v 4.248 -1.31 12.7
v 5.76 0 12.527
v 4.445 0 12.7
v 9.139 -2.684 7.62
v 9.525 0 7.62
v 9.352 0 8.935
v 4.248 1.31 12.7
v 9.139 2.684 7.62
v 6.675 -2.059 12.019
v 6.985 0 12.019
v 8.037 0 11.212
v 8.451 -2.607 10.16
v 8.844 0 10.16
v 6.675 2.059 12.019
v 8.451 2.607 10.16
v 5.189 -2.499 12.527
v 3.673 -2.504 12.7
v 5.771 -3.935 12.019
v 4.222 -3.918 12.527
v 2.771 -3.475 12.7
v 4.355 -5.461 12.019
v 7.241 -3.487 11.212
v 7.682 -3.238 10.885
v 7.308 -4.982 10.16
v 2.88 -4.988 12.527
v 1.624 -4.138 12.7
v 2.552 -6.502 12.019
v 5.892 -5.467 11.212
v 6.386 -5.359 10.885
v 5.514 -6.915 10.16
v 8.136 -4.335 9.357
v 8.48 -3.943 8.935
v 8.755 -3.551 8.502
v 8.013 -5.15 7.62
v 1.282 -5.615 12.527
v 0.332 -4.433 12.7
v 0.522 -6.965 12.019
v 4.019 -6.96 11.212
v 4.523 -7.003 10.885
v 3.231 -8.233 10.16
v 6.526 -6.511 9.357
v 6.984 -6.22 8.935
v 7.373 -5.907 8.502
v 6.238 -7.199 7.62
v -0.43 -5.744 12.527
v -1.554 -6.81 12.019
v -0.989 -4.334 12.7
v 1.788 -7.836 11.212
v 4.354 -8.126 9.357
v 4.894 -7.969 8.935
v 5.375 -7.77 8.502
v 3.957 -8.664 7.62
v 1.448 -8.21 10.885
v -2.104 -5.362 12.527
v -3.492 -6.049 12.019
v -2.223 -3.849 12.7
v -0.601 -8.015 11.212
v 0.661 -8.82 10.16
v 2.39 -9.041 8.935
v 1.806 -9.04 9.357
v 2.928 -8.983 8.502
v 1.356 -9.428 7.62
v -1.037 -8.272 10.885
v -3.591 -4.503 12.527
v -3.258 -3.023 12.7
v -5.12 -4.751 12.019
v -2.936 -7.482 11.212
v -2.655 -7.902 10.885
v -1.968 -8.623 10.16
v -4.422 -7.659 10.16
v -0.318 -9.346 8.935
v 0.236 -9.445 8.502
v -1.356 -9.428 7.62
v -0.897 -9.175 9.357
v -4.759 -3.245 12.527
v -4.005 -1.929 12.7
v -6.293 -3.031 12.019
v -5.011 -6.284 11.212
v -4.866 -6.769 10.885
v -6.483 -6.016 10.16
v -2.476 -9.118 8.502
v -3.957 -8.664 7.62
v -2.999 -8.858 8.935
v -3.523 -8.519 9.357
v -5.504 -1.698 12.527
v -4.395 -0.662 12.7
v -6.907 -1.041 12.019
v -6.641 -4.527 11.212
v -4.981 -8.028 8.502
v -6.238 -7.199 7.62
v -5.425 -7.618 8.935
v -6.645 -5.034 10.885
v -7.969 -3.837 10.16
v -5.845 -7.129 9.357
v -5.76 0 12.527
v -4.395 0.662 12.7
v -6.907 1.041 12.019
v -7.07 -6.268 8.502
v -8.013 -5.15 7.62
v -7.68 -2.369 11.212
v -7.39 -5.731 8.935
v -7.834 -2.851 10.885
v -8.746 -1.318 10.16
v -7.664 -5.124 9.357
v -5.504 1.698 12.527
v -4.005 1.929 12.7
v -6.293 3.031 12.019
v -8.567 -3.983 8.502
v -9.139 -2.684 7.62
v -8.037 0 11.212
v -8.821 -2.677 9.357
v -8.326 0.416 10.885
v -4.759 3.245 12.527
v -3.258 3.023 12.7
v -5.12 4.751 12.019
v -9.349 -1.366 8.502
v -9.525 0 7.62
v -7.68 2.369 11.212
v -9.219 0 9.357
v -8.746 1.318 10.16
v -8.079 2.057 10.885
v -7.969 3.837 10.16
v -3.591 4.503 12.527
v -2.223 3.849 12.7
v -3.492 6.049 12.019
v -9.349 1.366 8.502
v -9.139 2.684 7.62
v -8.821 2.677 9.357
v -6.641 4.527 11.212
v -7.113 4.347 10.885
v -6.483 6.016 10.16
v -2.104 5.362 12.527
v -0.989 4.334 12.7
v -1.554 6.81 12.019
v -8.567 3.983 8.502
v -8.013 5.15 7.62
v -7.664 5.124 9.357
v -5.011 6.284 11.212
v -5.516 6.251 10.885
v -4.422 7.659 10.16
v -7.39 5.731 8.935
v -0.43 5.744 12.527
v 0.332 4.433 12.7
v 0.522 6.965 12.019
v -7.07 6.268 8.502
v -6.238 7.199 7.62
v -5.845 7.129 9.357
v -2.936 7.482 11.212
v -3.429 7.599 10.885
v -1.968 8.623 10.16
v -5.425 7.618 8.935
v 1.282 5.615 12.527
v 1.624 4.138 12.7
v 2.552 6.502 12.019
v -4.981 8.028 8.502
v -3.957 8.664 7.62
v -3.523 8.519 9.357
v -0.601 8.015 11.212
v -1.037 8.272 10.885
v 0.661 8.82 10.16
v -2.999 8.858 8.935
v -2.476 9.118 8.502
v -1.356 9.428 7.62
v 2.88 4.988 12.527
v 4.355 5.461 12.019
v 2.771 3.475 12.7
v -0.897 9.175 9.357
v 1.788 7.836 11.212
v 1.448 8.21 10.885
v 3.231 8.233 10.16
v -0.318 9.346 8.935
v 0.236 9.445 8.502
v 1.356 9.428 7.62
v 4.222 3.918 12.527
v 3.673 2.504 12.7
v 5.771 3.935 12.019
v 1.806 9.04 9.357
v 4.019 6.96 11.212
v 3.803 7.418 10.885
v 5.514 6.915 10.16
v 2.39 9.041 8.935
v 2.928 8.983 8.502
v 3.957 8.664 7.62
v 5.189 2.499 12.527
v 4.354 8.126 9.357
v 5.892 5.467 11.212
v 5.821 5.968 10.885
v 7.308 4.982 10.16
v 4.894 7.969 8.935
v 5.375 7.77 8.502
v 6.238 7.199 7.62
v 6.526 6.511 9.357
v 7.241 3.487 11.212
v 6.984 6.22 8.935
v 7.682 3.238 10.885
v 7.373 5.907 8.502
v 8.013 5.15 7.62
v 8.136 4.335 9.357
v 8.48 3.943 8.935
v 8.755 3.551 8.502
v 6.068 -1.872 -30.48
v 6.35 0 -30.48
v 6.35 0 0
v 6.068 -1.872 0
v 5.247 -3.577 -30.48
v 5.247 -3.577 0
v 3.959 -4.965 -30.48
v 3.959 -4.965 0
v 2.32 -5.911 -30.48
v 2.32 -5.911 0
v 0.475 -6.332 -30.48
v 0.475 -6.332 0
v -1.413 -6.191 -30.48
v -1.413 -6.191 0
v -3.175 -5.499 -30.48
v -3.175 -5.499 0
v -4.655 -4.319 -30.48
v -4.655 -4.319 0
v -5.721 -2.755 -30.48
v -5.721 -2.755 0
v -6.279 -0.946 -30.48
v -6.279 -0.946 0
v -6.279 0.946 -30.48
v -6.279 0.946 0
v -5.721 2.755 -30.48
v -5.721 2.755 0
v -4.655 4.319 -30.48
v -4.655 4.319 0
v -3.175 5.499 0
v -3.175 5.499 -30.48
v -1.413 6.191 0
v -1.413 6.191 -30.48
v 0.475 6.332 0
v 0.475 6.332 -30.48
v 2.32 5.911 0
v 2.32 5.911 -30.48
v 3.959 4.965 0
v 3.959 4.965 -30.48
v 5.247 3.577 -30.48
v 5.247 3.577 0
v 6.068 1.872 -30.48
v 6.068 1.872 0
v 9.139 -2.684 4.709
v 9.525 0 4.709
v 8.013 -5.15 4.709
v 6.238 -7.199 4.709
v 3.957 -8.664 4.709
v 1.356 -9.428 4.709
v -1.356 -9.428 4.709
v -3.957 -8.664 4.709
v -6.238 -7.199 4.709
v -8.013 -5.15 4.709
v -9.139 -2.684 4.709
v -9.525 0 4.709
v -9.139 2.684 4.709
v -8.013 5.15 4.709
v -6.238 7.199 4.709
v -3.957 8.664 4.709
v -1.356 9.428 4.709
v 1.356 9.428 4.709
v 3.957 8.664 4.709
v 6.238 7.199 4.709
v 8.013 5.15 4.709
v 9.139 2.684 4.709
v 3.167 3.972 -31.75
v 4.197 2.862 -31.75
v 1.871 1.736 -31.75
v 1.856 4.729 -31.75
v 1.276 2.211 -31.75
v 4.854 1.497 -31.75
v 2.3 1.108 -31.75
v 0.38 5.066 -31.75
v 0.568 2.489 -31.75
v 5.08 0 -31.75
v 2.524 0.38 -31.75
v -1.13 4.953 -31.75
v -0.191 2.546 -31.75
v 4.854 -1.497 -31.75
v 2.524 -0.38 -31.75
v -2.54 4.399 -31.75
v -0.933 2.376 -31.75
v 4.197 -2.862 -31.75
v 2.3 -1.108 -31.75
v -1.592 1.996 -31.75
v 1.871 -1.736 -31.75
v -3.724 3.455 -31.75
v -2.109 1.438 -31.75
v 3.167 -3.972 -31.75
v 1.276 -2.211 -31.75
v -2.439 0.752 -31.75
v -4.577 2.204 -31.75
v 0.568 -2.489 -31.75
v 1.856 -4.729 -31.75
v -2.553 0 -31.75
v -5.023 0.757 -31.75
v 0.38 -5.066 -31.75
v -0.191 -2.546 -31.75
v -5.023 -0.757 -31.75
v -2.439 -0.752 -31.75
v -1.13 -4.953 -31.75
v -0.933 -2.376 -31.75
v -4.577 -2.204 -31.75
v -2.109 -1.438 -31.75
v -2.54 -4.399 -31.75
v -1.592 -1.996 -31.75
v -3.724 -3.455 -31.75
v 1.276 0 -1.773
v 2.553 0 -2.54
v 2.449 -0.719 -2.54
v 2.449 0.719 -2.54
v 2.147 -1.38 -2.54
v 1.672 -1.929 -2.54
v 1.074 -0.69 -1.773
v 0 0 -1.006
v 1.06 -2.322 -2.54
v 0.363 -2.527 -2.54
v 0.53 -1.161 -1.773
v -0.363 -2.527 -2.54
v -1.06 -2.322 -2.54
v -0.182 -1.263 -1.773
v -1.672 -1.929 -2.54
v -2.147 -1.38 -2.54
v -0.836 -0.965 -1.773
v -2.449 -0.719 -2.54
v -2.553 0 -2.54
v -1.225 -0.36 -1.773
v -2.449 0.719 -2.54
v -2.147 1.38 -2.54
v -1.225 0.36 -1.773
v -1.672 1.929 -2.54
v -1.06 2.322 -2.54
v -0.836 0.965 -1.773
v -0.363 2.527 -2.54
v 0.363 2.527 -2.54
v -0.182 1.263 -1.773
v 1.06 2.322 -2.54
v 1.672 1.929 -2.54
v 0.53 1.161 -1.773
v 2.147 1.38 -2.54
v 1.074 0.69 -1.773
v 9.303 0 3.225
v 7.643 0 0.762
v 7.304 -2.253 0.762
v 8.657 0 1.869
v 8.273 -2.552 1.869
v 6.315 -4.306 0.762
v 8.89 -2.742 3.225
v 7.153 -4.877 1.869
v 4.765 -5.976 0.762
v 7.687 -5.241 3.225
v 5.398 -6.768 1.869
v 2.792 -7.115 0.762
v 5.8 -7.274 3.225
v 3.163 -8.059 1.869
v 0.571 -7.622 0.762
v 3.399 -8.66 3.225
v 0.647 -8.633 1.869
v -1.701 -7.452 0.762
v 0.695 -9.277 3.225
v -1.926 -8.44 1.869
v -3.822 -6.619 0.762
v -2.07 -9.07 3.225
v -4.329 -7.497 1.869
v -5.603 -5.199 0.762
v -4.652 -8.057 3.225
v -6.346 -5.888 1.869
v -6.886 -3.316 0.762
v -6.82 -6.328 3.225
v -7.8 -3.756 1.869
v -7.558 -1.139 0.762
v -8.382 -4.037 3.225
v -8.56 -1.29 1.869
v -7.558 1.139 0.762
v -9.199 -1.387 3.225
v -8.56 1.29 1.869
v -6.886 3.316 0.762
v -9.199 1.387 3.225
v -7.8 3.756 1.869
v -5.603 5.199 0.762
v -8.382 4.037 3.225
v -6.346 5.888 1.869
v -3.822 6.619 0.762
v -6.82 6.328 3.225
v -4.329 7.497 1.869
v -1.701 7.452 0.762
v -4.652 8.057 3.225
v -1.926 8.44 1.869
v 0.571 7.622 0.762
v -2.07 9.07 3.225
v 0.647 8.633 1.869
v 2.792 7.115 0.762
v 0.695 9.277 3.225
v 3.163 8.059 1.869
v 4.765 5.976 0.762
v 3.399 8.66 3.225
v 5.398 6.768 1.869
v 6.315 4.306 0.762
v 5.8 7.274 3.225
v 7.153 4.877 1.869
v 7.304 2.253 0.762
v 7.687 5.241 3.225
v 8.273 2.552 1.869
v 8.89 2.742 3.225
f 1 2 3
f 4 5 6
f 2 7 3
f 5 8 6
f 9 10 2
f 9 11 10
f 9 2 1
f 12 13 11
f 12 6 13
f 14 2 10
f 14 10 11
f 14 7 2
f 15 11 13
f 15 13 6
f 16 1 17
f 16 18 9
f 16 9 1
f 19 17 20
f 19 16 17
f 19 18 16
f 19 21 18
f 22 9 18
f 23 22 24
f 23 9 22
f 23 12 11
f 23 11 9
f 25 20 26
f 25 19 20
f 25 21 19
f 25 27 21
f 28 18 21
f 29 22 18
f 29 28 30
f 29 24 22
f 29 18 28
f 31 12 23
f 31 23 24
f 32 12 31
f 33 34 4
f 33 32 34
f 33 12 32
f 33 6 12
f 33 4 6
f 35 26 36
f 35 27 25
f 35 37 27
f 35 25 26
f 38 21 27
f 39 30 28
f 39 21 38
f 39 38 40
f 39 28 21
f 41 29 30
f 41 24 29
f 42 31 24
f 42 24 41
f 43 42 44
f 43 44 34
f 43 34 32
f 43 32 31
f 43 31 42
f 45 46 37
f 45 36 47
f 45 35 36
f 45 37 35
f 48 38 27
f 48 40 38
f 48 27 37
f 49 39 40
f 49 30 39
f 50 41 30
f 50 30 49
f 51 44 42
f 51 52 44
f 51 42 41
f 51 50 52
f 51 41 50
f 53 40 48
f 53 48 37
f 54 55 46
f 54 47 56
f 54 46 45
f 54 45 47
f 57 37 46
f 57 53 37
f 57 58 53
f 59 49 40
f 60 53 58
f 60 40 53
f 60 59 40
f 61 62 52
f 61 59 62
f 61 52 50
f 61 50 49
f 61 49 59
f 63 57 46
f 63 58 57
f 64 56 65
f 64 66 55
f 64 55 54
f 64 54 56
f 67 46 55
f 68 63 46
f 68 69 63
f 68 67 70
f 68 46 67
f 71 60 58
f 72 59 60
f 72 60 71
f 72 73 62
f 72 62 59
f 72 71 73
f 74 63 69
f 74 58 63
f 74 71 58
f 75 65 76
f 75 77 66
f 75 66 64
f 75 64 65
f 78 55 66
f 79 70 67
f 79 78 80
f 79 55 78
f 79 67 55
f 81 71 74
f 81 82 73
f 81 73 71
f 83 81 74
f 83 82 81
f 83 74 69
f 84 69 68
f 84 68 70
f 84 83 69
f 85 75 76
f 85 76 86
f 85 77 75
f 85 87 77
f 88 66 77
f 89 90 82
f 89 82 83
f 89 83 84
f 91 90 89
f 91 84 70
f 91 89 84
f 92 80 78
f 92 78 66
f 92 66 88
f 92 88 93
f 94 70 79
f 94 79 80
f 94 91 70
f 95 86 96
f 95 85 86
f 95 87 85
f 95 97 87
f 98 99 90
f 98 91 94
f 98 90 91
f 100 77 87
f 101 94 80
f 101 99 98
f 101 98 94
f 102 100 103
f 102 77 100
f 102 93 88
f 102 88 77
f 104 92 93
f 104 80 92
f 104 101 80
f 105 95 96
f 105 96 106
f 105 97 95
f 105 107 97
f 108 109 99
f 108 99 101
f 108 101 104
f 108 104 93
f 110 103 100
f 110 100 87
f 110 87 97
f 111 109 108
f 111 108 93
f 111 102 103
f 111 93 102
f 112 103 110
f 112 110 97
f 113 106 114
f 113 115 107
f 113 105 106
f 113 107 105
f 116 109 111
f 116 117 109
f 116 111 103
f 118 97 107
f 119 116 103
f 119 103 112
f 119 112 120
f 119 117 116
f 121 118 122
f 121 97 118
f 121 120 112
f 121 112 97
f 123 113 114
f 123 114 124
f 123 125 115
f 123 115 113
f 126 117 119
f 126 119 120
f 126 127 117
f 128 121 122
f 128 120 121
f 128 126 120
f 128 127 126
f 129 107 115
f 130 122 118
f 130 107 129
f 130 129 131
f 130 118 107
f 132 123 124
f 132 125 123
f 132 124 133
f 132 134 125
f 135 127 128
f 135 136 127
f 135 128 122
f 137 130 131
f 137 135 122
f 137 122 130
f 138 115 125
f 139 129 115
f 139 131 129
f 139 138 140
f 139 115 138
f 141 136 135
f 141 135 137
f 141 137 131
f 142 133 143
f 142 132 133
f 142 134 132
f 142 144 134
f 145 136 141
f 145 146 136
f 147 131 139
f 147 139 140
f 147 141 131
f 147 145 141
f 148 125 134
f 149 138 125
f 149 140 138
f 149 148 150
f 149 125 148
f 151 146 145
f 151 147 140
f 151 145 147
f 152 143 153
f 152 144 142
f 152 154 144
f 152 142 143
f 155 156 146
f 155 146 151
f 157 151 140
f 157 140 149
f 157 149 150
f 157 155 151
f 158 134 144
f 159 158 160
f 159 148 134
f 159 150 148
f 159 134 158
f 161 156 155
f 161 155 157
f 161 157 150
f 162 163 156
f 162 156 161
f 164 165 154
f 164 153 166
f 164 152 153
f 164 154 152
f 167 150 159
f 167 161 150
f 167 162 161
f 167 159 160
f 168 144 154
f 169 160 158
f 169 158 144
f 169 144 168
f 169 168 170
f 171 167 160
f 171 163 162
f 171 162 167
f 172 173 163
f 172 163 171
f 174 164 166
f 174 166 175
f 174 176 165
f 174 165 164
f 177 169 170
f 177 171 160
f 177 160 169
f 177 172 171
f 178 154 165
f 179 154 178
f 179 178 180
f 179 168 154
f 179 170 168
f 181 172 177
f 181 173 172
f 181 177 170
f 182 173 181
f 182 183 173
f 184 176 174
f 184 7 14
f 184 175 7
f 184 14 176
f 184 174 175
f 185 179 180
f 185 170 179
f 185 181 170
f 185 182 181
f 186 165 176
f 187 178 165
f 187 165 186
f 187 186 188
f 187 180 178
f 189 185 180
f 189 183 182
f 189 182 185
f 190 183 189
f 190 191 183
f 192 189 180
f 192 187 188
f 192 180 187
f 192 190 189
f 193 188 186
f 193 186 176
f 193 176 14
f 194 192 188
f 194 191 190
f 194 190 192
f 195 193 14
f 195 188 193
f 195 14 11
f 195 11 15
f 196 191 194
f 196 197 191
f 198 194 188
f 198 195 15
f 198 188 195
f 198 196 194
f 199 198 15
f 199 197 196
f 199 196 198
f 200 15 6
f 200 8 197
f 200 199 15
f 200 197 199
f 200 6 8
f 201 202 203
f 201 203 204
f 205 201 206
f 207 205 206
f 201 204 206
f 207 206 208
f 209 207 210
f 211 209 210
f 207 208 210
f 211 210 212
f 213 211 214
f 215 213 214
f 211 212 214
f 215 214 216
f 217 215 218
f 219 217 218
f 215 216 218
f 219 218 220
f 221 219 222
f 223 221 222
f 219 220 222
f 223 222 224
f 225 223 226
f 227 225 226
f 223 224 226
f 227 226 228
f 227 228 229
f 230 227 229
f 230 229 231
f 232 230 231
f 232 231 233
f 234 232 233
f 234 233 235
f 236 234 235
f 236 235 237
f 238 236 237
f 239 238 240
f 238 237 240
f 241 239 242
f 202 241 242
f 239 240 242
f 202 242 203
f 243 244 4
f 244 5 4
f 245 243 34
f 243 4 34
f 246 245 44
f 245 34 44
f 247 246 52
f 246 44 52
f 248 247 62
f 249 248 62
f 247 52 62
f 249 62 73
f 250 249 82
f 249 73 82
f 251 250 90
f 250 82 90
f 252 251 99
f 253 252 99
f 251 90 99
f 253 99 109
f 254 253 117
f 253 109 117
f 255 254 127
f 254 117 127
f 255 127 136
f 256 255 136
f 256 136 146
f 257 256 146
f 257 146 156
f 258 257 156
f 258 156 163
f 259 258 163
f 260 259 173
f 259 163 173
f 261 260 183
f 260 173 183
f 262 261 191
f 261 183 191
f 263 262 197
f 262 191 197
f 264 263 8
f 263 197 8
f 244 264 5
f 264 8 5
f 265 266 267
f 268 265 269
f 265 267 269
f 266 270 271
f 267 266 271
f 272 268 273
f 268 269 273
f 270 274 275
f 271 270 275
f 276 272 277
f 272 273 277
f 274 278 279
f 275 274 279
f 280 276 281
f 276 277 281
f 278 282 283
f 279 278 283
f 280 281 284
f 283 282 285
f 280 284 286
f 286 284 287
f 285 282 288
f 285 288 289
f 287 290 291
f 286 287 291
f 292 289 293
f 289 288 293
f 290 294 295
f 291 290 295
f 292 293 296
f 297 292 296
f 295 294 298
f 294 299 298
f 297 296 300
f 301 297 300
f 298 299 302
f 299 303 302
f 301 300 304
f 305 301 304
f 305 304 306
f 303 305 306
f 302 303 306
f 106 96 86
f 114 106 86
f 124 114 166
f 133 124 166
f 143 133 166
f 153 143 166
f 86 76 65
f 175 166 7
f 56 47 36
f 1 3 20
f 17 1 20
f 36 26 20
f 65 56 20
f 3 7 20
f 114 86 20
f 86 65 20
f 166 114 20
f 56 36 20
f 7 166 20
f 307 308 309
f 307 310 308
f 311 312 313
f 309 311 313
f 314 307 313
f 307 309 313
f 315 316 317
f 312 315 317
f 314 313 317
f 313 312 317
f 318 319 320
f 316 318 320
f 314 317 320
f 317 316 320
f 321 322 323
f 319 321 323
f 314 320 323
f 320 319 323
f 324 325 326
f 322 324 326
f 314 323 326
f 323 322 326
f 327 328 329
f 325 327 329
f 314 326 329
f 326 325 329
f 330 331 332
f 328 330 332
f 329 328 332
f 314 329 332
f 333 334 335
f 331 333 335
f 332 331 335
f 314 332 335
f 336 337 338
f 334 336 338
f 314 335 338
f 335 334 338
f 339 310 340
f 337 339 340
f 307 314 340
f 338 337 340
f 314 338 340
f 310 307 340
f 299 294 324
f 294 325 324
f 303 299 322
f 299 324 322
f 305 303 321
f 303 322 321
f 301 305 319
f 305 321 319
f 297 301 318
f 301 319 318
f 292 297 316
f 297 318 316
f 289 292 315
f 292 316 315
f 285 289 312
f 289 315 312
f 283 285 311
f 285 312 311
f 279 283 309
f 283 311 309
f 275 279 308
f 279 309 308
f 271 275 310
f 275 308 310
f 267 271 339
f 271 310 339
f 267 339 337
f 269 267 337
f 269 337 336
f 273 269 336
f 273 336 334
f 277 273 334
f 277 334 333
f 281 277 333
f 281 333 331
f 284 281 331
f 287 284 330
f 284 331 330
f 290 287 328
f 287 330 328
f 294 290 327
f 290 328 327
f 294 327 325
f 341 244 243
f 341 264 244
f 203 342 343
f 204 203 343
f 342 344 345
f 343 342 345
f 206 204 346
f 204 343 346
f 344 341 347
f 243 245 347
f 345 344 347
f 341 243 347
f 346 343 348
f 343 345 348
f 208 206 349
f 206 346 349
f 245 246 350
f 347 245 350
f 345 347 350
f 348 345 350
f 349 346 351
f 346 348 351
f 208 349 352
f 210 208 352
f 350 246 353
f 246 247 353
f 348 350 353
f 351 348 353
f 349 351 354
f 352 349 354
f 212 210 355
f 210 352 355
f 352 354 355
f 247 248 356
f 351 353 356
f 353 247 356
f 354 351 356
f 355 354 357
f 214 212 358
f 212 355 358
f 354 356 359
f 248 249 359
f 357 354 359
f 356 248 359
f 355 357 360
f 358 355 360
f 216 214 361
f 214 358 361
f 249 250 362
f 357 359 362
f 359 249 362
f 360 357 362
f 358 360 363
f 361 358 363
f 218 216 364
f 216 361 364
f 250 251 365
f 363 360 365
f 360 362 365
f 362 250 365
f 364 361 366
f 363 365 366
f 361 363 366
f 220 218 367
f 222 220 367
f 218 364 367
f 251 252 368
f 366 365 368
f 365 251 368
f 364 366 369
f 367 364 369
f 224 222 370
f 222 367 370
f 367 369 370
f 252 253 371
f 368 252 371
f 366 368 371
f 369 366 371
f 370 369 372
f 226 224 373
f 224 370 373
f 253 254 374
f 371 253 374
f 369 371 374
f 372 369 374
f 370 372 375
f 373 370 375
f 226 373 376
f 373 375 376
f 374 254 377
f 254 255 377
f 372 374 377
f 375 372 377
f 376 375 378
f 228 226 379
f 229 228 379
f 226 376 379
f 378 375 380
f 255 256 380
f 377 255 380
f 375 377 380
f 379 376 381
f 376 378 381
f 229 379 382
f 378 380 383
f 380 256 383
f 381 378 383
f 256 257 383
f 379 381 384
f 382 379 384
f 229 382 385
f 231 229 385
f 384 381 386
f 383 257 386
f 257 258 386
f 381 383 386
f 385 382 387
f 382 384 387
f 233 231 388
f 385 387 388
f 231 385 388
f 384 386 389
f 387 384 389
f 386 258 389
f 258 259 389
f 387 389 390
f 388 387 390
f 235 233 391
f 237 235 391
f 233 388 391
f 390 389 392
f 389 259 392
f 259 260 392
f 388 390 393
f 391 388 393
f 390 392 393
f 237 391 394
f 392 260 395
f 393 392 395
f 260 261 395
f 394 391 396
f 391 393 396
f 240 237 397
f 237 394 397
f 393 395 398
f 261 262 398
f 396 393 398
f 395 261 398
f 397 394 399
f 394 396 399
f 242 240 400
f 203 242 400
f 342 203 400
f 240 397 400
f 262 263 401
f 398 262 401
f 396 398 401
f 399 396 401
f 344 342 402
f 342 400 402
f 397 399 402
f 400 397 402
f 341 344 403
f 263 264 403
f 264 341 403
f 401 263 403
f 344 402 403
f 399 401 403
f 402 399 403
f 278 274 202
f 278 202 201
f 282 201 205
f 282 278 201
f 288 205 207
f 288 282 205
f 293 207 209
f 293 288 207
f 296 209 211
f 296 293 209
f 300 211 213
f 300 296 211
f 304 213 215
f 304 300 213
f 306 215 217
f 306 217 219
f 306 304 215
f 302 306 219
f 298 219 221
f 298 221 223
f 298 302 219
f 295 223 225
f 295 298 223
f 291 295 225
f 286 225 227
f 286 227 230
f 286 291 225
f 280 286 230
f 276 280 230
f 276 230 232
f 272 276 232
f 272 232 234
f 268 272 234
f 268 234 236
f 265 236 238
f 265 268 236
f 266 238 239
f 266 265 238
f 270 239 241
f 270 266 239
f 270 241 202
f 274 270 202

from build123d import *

# Parameters (mm, degrees)
F3_SIZE  = 1.27
F5_D     = 5.1054
F5_DEPTH = 29.21
F5_TIP   = 1.5338169022


# Not quite as in the source:
# - a fillet or chamfer that OpenCascade refuses, or shapes differently, is made with other operations: its cross-section is extruded or revolved along the edge and cut away or added


with BuildPart() as f1:
    # F0 (on Front) → F1 (revolve)
    with BuildSketch(Plane.XZ):
        Polygon((9.525, 12.7), (0, 12.7), (0, -31.75), (6.35, -31.75), (6.35, 0), (9.525, 0), align=None)
    revolve(axis=Axis((0, 0, -3.4719856316), (0, 0, -1)))

    # F2: fillet of radius 5.08 on 2 edges, made by hand

    # F2_s1 → F2_t2 (revolve, cut)
    with BuildSketch(Plane.XZ):
        with BuildLine():
            ThreePointArc((4.445, 12.7), (8.0371024484, 11.2121024484), (9.525, 7.62))
            Line((9.525, 7.62), (9.525, 12.7))
            Line((9.525, 12.7), (4.445, 12.7))
        make_face()
    revolve(axis=Axis((0, 0, 12.7), (0, 0, -1)), mode=Mode.SUBTRACT)

    # F2_s3 → F2_t4 (revolve, cut)
    with BuildSketch(Plane.XZ):
        with BuildLine():
            ThreePointArc((6.35, 0), (8.6571134838, 1.8694797079), (9.525, 4.7092860393))
            Line((9.525, 4.7092860393), (9.525, 0))
            Line((9.525, 0), (6.35, 0))
        make_face()
    revolve(axis=Axis((0, 0, 0), (0, 0, -1)), mode=Mode.SUBTRACT)

    # F3
    f3_edges = [f1.edges().sort_by_distance(p)[0] for p in [
        (-6.35, 0, -31.75),
    ]]
    chamfer(f3_edges, length=F3_SIZE)

    # F5
    with Locations(Plane(origin=(0, 0, -31.75), x_dir=(1, 0, 0), z_dir=(0, 0, -1))):
        with Locations((0, 0)):
            Hole(F5_D / 2, depth=F5_DEPTH)
            with Locations((0, 0, -(F5_DEPTH + F5_TIP / 2))):  # 118° drill point
                Cone(0, F5_D / 2, F5_TIP, mode=Mode.SUBTRACT)


solid = f1.part
